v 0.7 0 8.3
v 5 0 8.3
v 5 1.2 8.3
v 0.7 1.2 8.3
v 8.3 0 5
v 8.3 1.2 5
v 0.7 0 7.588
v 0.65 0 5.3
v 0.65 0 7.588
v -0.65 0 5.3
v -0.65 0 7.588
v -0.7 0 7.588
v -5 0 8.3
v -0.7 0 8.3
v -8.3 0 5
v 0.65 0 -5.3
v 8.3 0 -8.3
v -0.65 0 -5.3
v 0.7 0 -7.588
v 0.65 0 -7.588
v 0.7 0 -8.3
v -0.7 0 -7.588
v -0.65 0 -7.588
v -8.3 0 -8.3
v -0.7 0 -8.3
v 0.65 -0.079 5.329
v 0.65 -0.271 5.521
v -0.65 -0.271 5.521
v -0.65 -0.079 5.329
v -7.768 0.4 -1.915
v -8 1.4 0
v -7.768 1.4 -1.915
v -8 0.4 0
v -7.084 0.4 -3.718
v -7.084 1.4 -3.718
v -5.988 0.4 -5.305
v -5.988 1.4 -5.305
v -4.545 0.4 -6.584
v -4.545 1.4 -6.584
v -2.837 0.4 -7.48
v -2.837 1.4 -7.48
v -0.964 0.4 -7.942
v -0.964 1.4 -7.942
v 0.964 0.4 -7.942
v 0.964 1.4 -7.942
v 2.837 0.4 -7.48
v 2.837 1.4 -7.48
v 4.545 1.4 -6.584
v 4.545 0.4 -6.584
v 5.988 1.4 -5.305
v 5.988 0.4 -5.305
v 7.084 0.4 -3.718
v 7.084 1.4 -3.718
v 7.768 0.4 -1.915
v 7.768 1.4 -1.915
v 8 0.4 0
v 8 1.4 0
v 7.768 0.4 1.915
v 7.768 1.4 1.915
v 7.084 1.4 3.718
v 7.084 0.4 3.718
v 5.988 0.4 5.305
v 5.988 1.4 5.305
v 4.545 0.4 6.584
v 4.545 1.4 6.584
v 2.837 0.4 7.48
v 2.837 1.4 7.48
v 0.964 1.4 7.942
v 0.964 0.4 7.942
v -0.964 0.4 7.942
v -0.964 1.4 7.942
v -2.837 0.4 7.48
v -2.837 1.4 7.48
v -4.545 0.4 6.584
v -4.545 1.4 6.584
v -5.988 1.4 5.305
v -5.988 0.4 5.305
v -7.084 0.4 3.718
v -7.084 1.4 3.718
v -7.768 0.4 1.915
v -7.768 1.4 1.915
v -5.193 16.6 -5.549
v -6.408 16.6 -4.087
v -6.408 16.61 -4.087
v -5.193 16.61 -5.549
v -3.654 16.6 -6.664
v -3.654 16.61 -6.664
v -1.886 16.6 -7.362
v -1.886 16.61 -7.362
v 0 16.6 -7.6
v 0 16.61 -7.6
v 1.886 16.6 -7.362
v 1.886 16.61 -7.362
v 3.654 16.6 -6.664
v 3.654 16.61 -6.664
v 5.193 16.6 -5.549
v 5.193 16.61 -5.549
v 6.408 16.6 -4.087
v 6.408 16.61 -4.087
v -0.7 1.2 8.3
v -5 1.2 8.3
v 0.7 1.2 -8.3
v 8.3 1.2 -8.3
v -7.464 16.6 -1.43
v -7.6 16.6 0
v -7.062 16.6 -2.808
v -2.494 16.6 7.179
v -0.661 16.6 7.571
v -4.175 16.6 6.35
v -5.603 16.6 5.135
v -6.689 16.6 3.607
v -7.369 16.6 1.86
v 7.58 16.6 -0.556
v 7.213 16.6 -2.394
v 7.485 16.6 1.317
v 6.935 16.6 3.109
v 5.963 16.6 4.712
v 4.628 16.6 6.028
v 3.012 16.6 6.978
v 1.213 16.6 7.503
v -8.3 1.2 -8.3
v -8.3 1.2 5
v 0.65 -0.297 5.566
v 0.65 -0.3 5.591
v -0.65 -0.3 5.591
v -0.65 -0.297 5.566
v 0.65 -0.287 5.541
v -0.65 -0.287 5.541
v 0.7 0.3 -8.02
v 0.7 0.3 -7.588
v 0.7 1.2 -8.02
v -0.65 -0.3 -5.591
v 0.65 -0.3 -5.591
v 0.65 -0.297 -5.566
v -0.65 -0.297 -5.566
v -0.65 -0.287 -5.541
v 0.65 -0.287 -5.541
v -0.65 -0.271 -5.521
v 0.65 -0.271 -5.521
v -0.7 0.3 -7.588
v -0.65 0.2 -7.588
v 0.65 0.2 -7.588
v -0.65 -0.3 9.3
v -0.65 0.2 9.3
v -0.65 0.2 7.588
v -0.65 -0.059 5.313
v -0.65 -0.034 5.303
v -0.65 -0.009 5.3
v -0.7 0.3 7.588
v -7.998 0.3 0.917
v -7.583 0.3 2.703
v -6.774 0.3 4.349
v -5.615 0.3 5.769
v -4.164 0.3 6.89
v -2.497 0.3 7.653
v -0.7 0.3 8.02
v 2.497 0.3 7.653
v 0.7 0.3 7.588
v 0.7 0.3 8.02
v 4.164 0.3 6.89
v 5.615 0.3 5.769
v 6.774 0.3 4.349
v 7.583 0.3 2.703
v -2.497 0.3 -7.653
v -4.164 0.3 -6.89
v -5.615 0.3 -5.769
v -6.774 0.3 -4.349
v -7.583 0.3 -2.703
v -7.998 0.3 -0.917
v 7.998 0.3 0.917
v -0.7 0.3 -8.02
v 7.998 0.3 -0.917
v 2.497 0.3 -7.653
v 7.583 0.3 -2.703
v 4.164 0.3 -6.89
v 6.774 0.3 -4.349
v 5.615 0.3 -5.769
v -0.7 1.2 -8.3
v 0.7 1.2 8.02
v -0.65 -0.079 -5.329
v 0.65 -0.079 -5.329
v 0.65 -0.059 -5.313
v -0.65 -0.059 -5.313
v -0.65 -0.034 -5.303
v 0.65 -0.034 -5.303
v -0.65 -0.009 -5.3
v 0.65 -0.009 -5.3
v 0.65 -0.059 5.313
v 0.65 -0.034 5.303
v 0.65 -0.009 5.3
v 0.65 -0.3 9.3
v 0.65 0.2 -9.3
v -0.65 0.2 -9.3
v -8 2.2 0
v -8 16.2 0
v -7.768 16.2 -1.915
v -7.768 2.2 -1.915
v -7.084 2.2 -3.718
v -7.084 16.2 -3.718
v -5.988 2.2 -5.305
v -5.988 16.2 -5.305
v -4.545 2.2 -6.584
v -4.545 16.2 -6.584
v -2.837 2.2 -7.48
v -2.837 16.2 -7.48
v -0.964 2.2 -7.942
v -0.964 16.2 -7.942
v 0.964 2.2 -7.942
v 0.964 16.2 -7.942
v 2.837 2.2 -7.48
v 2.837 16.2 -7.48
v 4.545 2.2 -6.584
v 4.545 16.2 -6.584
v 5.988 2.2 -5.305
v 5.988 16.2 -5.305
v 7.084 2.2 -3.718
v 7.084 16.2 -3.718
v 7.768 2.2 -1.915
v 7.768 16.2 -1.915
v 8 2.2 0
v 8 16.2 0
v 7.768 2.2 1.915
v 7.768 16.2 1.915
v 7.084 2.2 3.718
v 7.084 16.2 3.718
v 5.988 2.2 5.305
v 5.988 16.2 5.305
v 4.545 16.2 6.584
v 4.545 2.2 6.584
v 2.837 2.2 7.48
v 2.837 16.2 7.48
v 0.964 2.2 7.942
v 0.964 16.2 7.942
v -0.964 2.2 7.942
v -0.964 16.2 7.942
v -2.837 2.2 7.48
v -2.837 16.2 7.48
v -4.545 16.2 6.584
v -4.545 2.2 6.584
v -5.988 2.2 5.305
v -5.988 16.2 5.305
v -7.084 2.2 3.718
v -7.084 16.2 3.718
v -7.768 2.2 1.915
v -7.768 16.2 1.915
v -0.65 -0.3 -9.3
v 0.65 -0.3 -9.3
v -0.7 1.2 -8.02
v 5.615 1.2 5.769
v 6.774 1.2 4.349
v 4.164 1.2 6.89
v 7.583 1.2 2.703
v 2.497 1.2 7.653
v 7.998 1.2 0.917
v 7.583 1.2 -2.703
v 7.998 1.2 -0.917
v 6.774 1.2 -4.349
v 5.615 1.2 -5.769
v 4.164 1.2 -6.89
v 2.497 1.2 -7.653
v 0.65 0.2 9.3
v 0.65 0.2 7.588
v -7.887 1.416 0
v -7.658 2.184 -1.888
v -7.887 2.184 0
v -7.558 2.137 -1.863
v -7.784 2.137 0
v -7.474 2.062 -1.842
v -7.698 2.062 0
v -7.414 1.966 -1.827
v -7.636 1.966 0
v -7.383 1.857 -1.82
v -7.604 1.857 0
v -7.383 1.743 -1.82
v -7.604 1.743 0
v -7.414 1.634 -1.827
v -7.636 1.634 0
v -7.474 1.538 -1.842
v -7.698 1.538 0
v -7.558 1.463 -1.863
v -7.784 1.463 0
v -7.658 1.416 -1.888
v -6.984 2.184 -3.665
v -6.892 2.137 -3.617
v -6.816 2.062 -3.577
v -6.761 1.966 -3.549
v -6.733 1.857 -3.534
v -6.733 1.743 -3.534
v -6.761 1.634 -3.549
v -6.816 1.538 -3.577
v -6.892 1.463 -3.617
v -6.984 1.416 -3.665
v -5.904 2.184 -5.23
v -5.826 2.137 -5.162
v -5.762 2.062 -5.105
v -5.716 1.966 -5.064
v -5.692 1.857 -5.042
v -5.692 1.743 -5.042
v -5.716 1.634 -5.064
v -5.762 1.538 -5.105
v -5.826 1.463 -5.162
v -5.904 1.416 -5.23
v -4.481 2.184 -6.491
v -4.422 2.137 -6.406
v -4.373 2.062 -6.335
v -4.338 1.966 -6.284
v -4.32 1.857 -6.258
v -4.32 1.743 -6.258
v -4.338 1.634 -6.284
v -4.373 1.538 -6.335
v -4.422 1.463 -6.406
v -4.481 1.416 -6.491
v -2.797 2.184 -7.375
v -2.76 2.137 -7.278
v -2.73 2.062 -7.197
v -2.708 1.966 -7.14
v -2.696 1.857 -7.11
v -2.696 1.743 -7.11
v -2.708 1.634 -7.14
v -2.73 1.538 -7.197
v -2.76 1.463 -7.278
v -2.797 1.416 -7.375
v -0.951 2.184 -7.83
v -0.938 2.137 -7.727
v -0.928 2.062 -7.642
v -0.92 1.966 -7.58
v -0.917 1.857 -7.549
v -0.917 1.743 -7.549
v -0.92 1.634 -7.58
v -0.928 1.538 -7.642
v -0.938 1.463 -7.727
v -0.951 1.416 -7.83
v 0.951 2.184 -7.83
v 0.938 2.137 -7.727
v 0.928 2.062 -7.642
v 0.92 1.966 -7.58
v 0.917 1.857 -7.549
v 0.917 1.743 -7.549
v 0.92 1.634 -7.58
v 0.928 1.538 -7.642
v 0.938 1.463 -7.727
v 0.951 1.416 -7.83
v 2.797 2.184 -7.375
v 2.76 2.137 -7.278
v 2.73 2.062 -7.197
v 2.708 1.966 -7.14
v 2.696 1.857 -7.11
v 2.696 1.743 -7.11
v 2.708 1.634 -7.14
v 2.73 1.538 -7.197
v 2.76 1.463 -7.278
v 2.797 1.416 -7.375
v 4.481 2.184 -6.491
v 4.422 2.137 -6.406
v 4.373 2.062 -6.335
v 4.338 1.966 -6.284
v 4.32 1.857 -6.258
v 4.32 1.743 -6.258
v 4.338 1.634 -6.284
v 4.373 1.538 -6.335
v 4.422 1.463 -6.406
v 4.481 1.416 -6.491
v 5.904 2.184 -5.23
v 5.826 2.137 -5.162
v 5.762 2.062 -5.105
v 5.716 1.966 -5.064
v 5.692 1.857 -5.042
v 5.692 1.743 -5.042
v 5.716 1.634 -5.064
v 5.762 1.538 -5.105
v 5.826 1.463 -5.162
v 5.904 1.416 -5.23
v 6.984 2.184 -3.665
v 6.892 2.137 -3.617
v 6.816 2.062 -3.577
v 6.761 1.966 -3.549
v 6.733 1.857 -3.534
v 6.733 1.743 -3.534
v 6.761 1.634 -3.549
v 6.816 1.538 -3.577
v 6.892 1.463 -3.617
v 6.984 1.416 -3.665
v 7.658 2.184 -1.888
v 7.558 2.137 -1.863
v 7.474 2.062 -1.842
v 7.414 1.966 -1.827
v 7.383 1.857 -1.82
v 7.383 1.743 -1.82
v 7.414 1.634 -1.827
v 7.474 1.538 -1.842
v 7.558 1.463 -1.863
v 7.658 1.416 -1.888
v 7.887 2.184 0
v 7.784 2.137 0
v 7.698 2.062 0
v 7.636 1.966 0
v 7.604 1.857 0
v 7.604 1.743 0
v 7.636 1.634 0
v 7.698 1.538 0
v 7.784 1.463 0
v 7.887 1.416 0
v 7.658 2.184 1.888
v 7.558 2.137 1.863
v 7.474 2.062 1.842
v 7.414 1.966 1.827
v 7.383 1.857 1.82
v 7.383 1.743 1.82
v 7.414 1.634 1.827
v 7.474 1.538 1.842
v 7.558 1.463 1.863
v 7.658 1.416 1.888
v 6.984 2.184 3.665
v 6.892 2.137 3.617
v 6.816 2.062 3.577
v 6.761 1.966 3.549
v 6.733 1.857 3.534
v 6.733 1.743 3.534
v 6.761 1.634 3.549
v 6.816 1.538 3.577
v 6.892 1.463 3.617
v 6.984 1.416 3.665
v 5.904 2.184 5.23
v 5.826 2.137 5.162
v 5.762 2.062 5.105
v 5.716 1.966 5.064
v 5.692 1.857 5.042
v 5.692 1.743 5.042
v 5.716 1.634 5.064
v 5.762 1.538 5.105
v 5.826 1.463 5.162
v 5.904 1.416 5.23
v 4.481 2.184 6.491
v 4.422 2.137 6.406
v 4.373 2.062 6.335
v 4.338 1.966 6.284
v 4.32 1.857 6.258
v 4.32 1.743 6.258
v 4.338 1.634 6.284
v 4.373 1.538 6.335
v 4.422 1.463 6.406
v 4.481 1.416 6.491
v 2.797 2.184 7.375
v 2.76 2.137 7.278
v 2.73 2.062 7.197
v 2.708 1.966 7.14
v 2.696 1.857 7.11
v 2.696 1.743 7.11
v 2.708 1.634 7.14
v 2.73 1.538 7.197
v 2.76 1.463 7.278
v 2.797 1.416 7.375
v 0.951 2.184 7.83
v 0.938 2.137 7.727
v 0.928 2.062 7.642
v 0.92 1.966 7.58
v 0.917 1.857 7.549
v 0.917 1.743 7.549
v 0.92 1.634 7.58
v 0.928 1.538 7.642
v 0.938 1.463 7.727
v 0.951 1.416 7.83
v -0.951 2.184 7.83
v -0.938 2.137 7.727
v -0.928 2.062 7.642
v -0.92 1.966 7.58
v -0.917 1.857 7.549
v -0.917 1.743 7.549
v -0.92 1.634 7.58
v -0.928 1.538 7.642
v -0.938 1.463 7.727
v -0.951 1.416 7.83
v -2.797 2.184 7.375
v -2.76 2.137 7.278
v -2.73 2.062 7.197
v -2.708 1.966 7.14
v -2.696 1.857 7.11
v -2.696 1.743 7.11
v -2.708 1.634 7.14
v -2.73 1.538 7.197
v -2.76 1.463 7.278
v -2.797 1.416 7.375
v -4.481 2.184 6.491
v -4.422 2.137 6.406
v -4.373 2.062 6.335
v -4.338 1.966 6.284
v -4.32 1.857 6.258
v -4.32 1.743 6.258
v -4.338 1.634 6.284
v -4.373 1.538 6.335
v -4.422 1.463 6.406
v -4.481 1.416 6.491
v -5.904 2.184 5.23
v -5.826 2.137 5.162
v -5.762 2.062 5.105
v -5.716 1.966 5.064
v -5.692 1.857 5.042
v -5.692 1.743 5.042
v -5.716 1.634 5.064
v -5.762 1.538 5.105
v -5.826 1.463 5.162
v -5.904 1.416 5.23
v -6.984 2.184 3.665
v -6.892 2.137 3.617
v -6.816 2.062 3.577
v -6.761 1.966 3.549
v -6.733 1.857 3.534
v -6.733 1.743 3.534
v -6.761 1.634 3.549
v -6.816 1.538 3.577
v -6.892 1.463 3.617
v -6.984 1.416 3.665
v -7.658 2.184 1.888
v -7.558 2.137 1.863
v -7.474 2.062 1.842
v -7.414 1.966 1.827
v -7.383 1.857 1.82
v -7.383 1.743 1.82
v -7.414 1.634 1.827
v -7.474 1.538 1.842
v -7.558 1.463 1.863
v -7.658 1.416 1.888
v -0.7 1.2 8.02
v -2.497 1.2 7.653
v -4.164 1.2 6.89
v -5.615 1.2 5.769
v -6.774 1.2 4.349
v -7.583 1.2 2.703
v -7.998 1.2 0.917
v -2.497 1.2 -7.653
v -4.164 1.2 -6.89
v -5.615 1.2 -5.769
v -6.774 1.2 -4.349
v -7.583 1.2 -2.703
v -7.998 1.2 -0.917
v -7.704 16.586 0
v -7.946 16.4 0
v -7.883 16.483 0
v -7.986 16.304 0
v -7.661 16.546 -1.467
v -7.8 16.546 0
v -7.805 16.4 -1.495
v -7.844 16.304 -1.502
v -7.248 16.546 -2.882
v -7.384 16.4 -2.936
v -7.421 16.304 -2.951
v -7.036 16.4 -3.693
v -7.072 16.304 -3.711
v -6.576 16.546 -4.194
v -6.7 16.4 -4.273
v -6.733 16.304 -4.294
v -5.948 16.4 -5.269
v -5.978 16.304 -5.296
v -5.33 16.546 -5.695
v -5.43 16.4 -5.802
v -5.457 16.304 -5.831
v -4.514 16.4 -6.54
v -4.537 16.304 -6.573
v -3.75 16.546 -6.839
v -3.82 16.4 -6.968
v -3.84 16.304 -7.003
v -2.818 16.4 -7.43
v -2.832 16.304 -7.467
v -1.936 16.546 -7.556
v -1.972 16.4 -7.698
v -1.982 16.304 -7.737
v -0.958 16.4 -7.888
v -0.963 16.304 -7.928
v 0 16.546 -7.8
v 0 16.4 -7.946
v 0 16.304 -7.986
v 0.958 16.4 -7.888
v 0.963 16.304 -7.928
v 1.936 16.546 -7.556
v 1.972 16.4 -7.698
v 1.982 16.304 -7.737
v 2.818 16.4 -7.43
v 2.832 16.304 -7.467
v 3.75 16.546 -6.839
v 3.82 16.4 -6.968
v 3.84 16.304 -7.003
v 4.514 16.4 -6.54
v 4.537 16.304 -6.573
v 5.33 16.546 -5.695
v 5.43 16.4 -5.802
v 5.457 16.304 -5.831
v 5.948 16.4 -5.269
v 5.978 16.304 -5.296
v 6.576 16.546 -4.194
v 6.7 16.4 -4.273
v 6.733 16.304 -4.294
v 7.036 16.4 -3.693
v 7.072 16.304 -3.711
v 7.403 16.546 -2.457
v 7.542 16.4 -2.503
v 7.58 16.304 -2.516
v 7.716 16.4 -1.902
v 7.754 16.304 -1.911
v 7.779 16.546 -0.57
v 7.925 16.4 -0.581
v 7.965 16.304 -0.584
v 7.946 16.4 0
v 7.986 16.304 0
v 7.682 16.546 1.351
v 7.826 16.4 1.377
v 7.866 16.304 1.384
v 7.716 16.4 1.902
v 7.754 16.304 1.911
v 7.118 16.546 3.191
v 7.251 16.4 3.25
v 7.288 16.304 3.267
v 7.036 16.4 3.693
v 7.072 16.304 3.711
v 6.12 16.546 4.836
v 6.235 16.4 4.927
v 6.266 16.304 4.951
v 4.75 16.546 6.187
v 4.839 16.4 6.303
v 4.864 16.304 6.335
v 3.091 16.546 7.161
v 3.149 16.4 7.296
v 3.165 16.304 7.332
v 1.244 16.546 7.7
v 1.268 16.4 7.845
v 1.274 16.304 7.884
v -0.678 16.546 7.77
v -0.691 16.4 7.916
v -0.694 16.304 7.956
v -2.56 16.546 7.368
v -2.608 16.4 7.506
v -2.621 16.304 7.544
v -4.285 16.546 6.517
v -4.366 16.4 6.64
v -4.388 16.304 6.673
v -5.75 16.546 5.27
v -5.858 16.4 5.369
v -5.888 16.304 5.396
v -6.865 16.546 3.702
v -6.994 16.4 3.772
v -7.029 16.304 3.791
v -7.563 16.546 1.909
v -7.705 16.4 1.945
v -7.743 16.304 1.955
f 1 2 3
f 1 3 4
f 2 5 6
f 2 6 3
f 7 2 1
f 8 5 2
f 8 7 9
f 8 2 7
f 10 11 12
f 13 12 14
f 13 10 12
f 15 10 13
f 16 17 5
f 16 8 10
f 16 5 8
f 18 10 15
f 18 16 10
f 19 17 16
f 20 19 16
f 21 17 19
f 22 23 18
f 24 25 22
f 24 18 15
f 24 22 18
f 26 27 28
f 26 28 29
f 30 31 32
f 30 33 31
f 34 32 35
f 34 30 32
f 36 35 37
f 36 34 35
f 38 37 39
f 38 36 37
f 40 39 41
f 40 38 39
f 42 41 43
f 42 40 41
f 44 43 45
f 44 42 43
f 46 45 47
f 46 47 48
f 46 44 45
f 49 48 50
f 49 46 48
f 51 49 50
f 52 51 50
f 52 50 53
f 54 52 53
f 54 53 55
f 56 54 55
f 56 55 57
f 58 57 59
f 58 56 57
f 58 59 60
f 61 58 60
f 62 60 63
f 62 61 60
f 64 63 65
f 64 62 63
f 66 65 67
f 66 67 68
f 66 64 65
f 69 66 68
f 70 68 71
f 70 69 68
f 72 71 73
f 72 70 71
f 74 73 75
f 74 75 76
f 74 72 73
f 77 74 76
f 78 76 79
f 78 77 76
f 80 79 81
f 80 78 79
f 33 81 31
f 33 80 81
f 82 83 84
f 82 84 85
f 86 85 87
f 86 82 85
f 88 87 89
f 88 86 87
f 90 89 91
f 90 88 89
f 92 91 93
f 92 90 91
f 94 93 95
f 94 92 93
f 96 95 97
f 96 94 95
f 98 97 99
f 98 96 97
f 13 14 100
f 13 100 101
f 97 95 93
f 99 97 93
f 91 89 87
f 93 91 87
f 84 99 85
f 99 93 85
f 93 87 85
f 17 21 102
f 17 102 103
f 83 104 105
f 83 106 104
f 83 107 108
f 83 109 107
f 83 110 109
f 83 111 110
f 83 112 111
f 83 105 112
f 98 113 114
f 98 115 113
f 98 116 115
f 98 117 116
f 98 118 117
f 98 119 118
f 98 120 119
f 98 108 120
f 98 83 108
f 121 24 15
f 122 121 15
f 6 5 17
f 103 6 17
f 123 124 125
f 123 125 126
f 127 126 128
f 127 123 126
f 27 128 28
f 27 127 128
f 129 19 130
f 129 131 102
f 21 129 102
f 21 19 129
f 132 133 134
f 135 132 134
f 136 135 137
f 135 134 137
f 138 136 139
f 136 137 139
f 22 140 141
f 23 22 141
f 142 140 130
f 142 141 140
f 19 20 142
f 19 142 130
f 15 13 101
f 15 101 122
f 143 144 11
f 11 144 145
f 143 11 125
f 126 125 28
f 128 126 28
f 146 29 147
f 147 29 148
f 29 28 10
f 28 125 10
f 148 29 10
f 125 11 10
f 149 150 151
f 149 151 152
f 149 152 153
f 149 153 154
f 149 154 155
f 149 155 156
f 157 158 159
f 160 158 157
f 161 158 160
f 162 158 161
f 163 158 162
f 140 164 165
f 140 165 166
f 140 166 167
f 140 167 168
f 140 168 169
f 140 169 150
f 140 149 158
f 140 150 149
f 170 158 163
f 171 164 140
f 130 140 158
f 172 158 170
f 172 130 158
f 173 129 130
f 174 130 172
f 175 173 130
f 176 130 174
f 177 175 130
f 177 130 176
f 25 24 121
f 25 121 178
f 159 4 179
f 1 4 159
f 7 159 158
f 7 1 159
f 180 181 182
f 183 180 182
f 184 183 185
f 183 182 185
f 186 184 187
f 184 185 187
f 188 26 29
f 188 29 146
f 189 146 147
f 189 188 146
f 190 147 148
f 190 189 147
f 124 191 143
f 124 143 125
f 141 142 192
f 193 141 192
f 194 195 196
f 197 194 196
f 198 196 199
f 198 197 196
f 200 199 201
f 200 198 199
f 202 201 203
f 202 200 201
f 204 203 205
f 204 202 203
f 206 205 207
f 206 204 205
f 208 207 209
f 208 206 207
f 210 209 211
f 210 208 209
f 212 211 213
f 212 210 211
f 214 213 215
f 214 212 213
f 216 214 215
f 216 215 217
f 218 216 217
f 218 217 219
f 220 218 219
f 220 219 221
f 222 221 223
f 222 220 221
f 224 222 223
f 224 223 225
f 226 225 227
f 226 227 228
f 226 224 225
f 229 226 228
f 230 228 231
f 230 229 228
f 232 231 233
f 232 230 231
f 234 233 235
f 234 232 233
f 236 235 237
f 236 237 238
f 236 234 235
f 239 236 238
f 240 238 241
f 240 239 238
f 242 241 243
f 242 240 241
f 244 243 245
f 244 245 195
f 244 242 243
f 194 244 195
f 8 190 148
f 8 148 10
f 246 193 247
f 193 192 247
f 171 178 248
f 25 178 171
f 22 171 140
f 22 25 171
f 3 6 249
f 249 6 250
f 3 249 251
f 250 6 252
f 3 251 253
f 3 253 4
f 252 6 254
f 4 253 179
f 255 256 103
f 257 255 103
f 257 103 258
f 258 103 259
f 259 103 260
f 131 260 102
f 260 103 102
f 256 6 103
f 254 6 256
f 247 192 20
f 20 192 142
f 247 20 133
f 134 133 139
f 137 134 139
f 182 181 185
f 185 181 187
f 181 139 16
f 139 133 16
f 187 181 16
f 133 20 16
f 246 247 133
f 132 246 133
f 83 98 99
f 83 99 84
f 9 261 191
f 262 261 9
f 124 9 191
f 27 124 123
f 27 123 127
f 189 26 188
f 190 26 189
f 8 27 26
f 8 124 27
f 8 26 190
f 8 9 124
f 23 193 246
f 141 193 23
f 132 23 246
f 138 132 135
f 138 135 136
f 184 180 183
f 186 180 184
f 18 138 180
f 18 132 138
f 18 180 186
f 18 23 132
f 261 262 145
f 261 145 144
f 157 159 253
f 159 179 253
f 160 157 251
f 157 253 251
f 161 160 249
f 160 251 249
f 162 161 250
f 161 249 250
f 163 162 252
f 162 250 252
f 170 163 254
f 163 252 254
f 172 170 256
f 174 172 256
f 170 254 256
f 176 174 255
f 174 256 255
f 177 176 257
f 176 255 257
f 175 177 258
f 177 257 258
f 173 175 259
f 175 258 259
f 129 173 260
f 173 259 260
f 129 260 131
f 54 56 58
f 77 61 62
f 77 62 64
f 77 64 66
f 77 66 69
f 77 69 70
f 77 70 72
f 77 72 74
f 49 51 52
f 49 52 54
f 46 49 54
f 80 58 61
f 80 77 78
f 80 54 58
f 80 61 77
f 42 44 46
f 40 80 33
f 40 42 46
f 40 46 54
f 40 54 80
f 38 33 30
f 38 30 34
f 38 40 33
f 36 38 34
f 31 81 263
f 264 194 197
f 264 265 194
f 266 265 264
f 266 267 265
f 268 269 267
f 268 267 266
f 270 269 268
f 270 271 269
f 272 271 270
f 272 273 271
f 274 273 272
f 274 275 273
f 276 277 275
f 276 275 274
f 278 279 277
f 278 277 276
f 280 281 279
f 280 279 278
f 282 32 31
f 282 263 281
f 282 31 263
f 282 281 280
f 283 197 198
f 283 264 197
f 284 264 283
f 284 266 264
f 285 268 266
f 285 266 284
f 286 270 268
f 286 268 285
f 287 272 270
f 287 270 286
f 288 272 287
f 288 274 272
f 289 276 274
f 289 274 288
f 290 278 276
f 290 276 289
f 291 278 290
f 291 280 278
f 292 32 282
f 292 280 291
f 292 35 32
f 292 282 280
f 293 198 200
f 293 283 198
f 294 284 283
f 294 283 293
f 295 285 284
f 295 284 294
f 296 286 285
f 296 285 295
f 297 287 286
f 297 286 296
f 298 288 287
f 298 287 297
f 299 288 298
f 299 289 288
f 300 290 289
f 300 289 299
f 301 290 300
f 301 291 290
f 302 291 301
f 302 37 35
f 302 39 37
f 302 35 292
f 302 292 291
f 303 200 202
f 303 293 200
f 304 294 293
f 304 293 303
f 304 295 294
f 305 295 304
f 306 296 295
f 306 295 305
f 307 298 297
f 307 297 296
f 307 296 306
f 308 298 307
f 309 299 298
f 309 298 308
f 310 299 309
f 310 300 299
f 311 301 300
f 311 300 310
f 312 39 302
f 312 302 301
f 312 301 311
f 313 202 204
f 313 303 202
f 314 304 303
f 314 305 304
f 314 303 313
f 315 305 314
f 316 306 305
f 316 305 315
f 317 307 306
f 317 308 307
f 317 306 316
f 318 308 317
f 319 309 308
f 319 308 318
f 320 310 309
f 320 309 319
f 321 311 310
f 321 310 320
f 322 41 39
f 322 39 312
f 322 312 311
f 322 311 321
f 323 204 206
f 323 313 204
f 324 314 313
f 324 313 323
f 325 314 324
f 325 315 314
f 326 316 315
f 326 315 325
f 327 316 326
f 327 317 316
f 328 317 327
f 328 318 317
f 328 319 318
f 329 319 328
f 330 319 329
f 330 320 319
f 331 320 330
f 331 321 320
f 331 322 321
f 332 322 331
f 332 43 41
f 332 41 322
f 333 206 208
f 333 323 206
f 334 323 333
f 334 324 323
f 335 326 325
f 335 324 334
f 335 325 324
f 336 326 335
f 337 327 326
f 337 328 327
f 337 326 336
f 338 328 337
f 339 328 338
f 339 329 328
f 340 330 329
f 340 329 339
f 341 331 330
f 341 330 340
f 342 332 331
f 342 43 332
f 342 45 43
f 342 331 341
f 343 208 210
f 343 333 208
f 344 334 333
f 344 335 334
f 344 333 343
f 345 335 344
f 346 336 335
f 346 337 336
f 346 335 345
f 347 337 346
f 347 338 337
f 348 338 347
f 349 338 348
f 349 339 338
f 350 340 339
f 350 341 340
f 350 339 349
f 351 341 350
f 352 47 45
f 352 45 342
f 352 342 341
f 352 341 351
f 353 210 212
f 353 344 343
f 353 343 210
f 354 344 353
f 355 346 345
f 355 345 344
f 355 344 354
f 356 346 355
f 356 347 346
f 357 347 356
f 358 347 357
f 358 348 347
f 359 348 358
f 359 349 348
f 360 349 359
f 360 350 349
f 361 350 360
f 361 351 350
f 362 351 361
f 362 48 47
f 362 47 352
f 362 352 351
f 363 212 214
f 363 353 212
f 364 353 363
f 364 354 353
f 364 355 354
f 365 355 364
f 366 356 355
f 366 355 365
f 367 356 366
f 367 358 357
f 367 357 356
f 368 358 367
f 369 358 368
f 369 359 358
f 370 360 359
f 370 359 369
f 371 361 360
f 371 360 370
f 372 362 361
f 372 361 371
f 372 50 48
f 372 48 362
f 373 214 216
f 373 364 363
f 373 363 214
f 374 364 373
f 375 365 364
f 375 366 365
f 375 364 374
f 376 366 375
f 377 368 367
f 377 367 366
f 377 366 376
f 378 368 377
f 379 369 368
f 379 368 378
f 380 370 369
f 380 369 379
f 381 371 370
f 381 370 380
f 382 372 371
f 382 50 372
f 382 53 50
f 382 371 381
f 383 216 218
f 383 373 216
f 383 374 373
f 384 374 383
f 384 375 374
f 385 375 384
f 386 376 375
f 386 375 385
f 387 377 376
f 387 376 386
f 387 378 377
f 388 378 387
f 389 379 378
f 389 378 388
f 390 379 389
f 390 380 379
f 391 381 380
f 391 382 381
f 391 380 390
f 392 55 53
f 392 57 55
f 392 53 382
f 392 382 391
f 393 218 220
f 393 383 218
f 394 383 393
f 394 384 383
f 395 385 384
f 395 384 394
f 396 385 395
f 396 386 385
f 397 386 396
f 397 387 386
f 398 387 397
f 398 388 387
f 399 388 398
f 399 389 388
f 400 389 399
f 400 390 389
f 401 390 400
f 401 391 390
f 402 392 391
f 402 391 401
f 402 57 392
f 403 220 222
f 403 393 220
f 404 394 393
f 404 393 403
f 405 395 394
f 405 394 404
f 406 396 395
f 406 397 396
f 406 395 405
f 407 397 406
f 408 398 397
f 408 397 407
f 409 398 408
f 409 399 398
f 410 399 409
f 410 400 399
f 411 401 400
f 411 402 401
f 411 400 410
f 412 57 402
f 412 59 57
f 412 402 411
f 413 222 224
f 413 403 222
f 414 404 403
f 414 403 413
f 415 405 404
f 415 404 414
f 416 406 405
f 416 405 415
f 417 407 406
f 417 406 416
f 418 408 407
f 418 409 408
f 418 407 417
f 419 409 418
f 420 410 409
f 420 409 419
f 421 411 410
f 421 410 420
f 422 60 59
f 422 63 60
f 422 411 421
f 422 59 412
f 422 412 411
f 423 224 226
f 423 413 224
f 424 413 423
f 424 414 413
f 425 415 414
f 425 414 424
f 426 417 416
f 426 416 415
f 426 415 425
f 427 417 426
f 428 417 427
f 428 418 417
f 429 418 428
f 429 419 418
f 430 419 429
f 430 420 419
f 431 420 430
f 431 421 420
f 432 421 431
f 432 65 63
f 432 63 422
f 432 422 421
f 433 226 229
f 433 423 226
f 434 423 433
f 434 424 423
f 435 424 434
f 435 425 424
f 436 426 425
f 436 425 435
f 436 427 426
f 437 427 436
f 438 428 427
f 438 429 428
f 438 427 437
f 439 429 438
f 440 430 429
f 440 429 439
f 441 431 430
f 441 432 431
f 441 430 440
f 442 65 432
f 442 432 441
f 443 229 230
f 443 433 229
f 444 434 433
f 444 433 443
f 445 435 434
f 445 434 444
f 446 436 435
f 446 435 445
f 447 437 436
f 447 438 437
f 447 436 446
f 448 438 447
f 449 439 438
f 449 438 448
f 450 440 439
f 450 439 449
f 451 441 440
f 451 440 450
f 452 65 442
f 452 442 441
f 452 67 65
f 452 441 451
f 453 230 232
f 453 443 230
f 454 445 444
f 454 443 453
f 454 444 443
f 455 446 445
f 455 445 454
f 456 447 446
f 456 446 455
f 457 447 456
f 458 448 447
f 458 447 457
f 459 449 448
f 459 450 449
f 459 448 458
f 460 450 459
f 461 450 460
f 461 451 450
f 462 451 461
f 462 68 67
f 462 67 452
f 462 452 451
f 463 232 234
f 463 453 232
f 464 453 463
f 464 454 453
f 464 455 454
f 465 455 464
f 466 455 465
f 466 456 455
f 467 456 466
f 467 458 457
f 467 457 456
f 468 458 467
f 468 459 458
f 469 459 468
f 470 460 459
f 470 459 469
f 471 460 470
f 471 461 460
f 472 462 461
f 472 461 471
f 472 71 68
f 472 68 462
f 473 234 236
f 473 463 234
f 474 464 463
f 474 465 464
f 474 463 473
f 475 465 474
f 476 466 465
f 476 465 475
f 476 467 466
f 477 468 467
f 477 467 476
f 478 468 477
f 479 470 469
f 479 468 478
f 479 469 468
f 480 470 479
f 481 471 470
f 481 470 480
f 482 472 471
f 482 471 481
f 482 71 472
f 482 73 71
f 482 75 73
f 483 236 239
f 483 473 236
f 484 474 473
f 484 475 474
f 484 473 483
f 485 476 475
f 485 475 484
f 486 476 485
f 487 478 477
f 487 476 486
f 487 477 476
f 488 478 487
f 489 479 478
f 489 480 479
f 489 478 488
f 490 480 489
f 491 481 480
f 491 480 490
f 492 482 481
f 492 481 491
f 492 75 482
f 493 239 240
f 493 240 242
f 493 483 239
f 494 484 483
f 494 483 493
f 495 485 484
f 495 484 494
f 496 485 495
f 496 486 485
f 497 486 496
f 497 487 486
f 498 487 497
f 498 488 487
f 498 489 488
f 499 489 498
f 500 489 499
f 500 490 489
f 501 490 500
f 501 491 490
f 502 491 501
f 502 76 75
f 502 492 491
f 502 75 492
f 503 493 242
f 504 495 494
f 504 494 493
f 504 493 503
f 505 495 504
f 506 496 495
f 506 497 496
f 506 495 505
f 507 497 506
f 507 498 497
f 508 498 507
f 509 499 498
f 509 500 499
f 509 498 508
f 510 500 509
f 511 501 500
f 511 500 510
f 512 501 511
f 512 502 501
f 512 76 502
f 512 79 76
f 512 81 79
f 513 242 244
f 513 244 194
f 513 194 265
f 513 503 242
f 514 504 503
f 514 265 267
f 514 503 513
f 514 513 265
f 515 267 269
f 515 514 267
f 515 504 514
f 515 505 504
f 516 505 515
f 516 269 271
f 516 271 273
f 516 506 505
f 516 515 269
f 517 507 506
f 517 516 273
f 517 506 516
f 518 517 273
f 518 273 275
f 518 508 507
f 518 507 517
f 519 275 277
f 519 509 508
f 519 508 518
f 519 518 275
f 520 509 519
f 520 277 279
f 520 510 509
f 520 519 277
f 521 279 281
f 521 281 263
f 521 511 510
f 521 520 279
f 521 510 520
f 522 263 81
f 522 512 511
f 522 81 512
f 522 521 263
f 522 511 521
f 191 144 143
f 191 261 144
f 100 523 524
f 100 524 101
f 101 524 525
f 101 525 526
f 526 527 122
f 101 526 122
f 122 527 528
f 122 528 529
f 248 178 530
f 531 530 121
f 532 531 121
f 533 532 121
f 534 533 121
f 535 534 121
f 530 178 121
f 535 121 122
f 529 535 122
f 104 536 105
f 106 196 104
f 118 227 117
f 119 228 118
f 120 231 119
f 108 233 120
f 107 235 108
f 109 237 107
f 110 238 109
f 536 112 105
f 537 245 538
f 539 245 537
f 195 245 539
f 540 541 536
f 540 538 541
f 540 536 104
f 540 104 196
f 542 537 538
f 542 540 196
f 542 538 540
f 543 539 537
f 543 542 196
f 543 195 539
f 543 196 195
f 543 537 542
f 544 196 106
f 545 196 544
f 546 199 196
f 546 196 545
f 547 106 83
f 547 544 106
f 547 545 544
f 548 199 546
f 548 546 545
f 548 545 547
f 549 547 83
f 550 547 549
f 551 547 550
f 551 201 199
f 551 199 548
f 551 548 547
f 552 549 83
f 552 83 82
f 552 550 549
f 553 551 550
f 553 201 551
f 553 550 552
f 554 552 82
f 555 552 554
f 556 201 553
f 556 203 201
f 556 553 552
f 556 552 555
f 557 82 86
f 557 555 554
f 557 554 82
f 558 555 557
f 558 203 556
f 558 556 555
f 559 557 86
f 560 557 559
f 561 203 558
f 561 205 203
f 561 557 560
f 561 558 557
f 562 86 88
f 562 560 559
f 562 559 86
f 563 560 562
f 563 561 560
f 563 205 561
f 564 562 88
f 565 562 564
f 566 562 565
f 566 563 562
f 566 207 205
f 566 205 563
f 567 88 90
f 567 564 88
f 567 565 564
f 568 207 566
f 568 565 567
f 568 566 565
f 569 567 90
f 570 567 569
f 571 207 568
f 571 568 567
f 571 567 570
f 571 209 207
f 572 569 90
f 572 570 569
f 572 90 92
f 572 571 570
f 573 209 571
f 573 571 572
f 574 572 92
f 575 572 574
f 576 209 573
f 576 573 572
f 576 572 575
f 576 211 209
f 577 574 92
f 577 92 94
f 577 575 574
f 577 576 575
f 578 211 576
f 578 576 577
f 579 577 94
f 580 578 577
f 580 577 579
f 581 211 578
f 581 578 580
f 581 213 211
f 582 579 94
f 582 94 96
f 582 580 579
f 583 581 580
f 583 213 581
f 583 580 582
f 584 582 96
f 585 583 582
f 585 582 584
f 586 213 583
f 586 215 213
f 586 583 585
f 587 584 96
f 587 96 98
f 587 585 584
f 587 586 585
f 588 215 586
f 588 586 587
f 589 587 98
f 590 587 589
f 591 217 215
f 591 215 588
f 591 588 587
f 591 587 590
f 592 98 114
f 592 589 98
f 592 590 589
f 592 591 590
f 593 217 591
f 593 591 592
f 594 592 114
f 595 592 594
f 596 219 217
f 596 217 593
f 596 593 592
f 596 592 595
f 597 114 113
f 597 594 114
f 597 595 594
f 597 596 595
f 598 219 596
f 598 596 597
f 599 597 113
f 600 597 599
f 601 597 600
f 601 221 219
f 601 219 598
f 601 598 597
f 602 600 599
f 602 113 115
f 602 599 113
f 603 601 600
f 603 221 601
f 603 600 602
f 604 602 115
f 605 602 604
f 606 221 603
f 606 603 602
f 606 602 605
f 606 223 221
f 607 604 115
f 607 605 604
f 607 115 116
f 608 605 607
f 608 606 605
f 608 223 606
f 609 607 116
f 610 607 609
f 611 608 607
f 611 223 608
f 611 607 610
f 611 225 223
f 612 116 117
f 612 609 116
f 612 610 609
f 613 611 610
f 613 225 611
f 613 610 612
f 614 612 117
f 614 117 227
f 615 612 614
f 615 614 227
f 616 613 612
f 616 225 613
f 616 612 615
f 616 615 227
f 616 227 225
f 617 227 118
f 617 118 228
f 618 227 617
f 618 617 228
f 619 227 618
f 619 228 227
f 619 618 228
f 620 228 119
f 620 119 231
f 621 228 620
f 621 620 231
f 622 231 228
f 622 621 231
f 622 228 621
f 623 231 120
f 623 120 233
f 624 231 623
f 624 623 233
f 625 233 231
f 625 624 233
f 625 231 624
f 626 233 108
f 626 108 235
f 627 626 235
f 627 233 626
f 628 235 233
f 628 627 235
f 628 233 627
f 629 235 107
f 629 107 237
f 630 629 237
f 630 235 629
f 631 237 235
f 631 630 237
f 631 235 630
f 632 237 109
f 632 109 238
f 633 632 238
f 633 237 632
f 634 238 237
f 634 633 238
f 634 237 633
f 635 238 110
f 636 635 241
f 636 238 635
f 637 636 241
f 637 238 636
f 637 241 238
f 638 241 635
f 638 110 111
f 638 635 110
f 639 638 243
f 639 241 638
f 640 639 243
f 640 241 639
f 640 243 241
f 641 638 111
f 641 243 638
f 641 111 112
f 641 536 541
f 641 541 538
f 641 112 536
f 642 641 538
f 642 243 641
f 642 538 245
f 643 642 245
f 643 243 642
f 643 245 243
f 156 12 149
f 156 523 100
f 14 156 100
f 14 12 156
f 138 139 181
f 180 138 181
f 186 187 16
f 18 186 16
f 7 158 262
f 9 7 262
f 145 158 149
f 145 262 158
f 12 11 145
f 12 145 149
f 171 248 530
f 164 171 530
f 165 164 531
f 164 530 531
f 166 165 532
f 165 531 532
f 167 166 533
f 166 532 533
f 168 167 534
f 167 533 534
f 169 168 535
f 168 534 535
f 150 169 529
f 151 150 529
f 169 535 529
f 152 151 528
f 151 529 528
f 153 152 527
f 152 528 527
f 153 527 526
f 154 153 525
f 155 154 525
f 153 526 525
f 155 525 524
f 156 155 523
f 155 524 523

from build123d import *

# Parameters (mm, degrees)
BOSS_EXTRUDE1_DEPTH = 1.2
CUT_EXTRUDE1_START  = 1.2
SKETCH4_R           = 8.05
CUT_EXTRUDE1_DEPTH  = 0.9
BOSS_EXTRUDE2_DEPTH = 0.65
BOSS_EXTRUDE3_DEPTH = 0.01


with BuildPart() as part:
    # Sketch1 → Boss-Extrude1 (new body)
    with BuildSketch(Plane(origin=(0, 0, 0), x_dir=(1, 0, 0), z_dir=(0, 1, 0))):
        Polygon((-8.3, 8.3), (-0.7, 8.3), (-0.7, 7.58827238), (0.7, 7.58827238), (0.7, 8.3), (8.3, 8.3), (8.3, -1.8), (8.3, -5), (5, -8.3), (0.7, -8.3), (0.7, -7.58827238), (-0.7, -7.58827238), (-0.7, -8.3), (-5, -8.3), (-8.3, -5), (-8.3, -1.8), align=None)
    extrude(amount=BOSS_EXTRUDE1_DEPTH)

    # Sketch4 → Cut-Extrude1 (cut)
    with BuildSketch(Plane(origin=(0, 0, 0), x_dir=(1, 0, 0), z_dir=(0, 1, 0)).offset(CUT_EXTRUDE1_START)):
        Circle(SKETCH4_R)
    extrude(amount=-CUT_EXTRUDE1_DEPTH, mode=Mode.SUBTRACT)

    # Sketch5 → Boss-Extrude2 (add, symmetric)
    with BuildSketch(Plane(origin=(0, 0, 0), x_dir=(0, 0, -1), z_dir=(1, 0, 0))):
        with BuildLine():
            Line((-9.3, 0.2), (-9.3, -0.3))
            Line((-9.3, -0.3), (-5.591421356, -0.3))
            ThreePointArc((-5.591421356, -0.3), (-5.553153013, -0.292387953), (-5.520710678, -0.270710678))
            Line((-5.520710678, -0.270710678), (-5.329289322, -0.079289322))
            ThreePointArc((-5.329289322, -0.079289322), (-5.307612047, -0.046846987), (-5.3, -0.008578644))
            Line((-5.3, -0.008578644), (-5.3, 0.2))
            Line((-5.3, 0.2), (-9.3, 0.2))
        make_face()
    boss_extrude2 = extrude(amount=BOSS_EXTRUDE2_DEPTH, both=True)

    # Mirror1: Boss-Extrude2 across plane
    add(boss_extrude2.mirror(Plane.XY))


with BuildPart() as body_2:
    # Sketch3 → Revolve1 (revolve)
    with BuildSketch(Plane.XY):
        with BuildLine():
            Line((-8, 16.2), (-8, 2.2))
            ThreePointArc((-8, 2.2), (-7.6, 1.8), (-8, 1.4))
            Line((-8, 1.4), (-8, 0.4))
            Line((-8, 0.4), (0, 0.4))
            Line((0, 0.4), (0, 16.6))
            Line((0, 16.6), (-7.6, 16.6))
            ThreePointArc((-7.6, 16.6), (-7.882842712, 16.482842712), (-8, 16.2))
        make_face()
    revolve(axis=Axis((0, 22.223469288, 0), (0, -1, 0)))

    # Sketch6 → Boss-Extrude3 (add)
    with BuildSketch(Plane(origin=(0, 16.6, 0), x_dir=(1, 0, 0), z_dir=(0, 1, 0))):
        with BuildLine():
            Line((6.40770054, 4.086731431), (-6.40770054, 4.086731431))
            ThreePointArc((-6.40770054, 4.086731431), (0, 7.6), (6.40770054, 4.086731431))
        make_face()
    extrude(amount=BOSS_EXTRUDE3_DEPTH)


solid = Compound([part.part, body_2.part])
